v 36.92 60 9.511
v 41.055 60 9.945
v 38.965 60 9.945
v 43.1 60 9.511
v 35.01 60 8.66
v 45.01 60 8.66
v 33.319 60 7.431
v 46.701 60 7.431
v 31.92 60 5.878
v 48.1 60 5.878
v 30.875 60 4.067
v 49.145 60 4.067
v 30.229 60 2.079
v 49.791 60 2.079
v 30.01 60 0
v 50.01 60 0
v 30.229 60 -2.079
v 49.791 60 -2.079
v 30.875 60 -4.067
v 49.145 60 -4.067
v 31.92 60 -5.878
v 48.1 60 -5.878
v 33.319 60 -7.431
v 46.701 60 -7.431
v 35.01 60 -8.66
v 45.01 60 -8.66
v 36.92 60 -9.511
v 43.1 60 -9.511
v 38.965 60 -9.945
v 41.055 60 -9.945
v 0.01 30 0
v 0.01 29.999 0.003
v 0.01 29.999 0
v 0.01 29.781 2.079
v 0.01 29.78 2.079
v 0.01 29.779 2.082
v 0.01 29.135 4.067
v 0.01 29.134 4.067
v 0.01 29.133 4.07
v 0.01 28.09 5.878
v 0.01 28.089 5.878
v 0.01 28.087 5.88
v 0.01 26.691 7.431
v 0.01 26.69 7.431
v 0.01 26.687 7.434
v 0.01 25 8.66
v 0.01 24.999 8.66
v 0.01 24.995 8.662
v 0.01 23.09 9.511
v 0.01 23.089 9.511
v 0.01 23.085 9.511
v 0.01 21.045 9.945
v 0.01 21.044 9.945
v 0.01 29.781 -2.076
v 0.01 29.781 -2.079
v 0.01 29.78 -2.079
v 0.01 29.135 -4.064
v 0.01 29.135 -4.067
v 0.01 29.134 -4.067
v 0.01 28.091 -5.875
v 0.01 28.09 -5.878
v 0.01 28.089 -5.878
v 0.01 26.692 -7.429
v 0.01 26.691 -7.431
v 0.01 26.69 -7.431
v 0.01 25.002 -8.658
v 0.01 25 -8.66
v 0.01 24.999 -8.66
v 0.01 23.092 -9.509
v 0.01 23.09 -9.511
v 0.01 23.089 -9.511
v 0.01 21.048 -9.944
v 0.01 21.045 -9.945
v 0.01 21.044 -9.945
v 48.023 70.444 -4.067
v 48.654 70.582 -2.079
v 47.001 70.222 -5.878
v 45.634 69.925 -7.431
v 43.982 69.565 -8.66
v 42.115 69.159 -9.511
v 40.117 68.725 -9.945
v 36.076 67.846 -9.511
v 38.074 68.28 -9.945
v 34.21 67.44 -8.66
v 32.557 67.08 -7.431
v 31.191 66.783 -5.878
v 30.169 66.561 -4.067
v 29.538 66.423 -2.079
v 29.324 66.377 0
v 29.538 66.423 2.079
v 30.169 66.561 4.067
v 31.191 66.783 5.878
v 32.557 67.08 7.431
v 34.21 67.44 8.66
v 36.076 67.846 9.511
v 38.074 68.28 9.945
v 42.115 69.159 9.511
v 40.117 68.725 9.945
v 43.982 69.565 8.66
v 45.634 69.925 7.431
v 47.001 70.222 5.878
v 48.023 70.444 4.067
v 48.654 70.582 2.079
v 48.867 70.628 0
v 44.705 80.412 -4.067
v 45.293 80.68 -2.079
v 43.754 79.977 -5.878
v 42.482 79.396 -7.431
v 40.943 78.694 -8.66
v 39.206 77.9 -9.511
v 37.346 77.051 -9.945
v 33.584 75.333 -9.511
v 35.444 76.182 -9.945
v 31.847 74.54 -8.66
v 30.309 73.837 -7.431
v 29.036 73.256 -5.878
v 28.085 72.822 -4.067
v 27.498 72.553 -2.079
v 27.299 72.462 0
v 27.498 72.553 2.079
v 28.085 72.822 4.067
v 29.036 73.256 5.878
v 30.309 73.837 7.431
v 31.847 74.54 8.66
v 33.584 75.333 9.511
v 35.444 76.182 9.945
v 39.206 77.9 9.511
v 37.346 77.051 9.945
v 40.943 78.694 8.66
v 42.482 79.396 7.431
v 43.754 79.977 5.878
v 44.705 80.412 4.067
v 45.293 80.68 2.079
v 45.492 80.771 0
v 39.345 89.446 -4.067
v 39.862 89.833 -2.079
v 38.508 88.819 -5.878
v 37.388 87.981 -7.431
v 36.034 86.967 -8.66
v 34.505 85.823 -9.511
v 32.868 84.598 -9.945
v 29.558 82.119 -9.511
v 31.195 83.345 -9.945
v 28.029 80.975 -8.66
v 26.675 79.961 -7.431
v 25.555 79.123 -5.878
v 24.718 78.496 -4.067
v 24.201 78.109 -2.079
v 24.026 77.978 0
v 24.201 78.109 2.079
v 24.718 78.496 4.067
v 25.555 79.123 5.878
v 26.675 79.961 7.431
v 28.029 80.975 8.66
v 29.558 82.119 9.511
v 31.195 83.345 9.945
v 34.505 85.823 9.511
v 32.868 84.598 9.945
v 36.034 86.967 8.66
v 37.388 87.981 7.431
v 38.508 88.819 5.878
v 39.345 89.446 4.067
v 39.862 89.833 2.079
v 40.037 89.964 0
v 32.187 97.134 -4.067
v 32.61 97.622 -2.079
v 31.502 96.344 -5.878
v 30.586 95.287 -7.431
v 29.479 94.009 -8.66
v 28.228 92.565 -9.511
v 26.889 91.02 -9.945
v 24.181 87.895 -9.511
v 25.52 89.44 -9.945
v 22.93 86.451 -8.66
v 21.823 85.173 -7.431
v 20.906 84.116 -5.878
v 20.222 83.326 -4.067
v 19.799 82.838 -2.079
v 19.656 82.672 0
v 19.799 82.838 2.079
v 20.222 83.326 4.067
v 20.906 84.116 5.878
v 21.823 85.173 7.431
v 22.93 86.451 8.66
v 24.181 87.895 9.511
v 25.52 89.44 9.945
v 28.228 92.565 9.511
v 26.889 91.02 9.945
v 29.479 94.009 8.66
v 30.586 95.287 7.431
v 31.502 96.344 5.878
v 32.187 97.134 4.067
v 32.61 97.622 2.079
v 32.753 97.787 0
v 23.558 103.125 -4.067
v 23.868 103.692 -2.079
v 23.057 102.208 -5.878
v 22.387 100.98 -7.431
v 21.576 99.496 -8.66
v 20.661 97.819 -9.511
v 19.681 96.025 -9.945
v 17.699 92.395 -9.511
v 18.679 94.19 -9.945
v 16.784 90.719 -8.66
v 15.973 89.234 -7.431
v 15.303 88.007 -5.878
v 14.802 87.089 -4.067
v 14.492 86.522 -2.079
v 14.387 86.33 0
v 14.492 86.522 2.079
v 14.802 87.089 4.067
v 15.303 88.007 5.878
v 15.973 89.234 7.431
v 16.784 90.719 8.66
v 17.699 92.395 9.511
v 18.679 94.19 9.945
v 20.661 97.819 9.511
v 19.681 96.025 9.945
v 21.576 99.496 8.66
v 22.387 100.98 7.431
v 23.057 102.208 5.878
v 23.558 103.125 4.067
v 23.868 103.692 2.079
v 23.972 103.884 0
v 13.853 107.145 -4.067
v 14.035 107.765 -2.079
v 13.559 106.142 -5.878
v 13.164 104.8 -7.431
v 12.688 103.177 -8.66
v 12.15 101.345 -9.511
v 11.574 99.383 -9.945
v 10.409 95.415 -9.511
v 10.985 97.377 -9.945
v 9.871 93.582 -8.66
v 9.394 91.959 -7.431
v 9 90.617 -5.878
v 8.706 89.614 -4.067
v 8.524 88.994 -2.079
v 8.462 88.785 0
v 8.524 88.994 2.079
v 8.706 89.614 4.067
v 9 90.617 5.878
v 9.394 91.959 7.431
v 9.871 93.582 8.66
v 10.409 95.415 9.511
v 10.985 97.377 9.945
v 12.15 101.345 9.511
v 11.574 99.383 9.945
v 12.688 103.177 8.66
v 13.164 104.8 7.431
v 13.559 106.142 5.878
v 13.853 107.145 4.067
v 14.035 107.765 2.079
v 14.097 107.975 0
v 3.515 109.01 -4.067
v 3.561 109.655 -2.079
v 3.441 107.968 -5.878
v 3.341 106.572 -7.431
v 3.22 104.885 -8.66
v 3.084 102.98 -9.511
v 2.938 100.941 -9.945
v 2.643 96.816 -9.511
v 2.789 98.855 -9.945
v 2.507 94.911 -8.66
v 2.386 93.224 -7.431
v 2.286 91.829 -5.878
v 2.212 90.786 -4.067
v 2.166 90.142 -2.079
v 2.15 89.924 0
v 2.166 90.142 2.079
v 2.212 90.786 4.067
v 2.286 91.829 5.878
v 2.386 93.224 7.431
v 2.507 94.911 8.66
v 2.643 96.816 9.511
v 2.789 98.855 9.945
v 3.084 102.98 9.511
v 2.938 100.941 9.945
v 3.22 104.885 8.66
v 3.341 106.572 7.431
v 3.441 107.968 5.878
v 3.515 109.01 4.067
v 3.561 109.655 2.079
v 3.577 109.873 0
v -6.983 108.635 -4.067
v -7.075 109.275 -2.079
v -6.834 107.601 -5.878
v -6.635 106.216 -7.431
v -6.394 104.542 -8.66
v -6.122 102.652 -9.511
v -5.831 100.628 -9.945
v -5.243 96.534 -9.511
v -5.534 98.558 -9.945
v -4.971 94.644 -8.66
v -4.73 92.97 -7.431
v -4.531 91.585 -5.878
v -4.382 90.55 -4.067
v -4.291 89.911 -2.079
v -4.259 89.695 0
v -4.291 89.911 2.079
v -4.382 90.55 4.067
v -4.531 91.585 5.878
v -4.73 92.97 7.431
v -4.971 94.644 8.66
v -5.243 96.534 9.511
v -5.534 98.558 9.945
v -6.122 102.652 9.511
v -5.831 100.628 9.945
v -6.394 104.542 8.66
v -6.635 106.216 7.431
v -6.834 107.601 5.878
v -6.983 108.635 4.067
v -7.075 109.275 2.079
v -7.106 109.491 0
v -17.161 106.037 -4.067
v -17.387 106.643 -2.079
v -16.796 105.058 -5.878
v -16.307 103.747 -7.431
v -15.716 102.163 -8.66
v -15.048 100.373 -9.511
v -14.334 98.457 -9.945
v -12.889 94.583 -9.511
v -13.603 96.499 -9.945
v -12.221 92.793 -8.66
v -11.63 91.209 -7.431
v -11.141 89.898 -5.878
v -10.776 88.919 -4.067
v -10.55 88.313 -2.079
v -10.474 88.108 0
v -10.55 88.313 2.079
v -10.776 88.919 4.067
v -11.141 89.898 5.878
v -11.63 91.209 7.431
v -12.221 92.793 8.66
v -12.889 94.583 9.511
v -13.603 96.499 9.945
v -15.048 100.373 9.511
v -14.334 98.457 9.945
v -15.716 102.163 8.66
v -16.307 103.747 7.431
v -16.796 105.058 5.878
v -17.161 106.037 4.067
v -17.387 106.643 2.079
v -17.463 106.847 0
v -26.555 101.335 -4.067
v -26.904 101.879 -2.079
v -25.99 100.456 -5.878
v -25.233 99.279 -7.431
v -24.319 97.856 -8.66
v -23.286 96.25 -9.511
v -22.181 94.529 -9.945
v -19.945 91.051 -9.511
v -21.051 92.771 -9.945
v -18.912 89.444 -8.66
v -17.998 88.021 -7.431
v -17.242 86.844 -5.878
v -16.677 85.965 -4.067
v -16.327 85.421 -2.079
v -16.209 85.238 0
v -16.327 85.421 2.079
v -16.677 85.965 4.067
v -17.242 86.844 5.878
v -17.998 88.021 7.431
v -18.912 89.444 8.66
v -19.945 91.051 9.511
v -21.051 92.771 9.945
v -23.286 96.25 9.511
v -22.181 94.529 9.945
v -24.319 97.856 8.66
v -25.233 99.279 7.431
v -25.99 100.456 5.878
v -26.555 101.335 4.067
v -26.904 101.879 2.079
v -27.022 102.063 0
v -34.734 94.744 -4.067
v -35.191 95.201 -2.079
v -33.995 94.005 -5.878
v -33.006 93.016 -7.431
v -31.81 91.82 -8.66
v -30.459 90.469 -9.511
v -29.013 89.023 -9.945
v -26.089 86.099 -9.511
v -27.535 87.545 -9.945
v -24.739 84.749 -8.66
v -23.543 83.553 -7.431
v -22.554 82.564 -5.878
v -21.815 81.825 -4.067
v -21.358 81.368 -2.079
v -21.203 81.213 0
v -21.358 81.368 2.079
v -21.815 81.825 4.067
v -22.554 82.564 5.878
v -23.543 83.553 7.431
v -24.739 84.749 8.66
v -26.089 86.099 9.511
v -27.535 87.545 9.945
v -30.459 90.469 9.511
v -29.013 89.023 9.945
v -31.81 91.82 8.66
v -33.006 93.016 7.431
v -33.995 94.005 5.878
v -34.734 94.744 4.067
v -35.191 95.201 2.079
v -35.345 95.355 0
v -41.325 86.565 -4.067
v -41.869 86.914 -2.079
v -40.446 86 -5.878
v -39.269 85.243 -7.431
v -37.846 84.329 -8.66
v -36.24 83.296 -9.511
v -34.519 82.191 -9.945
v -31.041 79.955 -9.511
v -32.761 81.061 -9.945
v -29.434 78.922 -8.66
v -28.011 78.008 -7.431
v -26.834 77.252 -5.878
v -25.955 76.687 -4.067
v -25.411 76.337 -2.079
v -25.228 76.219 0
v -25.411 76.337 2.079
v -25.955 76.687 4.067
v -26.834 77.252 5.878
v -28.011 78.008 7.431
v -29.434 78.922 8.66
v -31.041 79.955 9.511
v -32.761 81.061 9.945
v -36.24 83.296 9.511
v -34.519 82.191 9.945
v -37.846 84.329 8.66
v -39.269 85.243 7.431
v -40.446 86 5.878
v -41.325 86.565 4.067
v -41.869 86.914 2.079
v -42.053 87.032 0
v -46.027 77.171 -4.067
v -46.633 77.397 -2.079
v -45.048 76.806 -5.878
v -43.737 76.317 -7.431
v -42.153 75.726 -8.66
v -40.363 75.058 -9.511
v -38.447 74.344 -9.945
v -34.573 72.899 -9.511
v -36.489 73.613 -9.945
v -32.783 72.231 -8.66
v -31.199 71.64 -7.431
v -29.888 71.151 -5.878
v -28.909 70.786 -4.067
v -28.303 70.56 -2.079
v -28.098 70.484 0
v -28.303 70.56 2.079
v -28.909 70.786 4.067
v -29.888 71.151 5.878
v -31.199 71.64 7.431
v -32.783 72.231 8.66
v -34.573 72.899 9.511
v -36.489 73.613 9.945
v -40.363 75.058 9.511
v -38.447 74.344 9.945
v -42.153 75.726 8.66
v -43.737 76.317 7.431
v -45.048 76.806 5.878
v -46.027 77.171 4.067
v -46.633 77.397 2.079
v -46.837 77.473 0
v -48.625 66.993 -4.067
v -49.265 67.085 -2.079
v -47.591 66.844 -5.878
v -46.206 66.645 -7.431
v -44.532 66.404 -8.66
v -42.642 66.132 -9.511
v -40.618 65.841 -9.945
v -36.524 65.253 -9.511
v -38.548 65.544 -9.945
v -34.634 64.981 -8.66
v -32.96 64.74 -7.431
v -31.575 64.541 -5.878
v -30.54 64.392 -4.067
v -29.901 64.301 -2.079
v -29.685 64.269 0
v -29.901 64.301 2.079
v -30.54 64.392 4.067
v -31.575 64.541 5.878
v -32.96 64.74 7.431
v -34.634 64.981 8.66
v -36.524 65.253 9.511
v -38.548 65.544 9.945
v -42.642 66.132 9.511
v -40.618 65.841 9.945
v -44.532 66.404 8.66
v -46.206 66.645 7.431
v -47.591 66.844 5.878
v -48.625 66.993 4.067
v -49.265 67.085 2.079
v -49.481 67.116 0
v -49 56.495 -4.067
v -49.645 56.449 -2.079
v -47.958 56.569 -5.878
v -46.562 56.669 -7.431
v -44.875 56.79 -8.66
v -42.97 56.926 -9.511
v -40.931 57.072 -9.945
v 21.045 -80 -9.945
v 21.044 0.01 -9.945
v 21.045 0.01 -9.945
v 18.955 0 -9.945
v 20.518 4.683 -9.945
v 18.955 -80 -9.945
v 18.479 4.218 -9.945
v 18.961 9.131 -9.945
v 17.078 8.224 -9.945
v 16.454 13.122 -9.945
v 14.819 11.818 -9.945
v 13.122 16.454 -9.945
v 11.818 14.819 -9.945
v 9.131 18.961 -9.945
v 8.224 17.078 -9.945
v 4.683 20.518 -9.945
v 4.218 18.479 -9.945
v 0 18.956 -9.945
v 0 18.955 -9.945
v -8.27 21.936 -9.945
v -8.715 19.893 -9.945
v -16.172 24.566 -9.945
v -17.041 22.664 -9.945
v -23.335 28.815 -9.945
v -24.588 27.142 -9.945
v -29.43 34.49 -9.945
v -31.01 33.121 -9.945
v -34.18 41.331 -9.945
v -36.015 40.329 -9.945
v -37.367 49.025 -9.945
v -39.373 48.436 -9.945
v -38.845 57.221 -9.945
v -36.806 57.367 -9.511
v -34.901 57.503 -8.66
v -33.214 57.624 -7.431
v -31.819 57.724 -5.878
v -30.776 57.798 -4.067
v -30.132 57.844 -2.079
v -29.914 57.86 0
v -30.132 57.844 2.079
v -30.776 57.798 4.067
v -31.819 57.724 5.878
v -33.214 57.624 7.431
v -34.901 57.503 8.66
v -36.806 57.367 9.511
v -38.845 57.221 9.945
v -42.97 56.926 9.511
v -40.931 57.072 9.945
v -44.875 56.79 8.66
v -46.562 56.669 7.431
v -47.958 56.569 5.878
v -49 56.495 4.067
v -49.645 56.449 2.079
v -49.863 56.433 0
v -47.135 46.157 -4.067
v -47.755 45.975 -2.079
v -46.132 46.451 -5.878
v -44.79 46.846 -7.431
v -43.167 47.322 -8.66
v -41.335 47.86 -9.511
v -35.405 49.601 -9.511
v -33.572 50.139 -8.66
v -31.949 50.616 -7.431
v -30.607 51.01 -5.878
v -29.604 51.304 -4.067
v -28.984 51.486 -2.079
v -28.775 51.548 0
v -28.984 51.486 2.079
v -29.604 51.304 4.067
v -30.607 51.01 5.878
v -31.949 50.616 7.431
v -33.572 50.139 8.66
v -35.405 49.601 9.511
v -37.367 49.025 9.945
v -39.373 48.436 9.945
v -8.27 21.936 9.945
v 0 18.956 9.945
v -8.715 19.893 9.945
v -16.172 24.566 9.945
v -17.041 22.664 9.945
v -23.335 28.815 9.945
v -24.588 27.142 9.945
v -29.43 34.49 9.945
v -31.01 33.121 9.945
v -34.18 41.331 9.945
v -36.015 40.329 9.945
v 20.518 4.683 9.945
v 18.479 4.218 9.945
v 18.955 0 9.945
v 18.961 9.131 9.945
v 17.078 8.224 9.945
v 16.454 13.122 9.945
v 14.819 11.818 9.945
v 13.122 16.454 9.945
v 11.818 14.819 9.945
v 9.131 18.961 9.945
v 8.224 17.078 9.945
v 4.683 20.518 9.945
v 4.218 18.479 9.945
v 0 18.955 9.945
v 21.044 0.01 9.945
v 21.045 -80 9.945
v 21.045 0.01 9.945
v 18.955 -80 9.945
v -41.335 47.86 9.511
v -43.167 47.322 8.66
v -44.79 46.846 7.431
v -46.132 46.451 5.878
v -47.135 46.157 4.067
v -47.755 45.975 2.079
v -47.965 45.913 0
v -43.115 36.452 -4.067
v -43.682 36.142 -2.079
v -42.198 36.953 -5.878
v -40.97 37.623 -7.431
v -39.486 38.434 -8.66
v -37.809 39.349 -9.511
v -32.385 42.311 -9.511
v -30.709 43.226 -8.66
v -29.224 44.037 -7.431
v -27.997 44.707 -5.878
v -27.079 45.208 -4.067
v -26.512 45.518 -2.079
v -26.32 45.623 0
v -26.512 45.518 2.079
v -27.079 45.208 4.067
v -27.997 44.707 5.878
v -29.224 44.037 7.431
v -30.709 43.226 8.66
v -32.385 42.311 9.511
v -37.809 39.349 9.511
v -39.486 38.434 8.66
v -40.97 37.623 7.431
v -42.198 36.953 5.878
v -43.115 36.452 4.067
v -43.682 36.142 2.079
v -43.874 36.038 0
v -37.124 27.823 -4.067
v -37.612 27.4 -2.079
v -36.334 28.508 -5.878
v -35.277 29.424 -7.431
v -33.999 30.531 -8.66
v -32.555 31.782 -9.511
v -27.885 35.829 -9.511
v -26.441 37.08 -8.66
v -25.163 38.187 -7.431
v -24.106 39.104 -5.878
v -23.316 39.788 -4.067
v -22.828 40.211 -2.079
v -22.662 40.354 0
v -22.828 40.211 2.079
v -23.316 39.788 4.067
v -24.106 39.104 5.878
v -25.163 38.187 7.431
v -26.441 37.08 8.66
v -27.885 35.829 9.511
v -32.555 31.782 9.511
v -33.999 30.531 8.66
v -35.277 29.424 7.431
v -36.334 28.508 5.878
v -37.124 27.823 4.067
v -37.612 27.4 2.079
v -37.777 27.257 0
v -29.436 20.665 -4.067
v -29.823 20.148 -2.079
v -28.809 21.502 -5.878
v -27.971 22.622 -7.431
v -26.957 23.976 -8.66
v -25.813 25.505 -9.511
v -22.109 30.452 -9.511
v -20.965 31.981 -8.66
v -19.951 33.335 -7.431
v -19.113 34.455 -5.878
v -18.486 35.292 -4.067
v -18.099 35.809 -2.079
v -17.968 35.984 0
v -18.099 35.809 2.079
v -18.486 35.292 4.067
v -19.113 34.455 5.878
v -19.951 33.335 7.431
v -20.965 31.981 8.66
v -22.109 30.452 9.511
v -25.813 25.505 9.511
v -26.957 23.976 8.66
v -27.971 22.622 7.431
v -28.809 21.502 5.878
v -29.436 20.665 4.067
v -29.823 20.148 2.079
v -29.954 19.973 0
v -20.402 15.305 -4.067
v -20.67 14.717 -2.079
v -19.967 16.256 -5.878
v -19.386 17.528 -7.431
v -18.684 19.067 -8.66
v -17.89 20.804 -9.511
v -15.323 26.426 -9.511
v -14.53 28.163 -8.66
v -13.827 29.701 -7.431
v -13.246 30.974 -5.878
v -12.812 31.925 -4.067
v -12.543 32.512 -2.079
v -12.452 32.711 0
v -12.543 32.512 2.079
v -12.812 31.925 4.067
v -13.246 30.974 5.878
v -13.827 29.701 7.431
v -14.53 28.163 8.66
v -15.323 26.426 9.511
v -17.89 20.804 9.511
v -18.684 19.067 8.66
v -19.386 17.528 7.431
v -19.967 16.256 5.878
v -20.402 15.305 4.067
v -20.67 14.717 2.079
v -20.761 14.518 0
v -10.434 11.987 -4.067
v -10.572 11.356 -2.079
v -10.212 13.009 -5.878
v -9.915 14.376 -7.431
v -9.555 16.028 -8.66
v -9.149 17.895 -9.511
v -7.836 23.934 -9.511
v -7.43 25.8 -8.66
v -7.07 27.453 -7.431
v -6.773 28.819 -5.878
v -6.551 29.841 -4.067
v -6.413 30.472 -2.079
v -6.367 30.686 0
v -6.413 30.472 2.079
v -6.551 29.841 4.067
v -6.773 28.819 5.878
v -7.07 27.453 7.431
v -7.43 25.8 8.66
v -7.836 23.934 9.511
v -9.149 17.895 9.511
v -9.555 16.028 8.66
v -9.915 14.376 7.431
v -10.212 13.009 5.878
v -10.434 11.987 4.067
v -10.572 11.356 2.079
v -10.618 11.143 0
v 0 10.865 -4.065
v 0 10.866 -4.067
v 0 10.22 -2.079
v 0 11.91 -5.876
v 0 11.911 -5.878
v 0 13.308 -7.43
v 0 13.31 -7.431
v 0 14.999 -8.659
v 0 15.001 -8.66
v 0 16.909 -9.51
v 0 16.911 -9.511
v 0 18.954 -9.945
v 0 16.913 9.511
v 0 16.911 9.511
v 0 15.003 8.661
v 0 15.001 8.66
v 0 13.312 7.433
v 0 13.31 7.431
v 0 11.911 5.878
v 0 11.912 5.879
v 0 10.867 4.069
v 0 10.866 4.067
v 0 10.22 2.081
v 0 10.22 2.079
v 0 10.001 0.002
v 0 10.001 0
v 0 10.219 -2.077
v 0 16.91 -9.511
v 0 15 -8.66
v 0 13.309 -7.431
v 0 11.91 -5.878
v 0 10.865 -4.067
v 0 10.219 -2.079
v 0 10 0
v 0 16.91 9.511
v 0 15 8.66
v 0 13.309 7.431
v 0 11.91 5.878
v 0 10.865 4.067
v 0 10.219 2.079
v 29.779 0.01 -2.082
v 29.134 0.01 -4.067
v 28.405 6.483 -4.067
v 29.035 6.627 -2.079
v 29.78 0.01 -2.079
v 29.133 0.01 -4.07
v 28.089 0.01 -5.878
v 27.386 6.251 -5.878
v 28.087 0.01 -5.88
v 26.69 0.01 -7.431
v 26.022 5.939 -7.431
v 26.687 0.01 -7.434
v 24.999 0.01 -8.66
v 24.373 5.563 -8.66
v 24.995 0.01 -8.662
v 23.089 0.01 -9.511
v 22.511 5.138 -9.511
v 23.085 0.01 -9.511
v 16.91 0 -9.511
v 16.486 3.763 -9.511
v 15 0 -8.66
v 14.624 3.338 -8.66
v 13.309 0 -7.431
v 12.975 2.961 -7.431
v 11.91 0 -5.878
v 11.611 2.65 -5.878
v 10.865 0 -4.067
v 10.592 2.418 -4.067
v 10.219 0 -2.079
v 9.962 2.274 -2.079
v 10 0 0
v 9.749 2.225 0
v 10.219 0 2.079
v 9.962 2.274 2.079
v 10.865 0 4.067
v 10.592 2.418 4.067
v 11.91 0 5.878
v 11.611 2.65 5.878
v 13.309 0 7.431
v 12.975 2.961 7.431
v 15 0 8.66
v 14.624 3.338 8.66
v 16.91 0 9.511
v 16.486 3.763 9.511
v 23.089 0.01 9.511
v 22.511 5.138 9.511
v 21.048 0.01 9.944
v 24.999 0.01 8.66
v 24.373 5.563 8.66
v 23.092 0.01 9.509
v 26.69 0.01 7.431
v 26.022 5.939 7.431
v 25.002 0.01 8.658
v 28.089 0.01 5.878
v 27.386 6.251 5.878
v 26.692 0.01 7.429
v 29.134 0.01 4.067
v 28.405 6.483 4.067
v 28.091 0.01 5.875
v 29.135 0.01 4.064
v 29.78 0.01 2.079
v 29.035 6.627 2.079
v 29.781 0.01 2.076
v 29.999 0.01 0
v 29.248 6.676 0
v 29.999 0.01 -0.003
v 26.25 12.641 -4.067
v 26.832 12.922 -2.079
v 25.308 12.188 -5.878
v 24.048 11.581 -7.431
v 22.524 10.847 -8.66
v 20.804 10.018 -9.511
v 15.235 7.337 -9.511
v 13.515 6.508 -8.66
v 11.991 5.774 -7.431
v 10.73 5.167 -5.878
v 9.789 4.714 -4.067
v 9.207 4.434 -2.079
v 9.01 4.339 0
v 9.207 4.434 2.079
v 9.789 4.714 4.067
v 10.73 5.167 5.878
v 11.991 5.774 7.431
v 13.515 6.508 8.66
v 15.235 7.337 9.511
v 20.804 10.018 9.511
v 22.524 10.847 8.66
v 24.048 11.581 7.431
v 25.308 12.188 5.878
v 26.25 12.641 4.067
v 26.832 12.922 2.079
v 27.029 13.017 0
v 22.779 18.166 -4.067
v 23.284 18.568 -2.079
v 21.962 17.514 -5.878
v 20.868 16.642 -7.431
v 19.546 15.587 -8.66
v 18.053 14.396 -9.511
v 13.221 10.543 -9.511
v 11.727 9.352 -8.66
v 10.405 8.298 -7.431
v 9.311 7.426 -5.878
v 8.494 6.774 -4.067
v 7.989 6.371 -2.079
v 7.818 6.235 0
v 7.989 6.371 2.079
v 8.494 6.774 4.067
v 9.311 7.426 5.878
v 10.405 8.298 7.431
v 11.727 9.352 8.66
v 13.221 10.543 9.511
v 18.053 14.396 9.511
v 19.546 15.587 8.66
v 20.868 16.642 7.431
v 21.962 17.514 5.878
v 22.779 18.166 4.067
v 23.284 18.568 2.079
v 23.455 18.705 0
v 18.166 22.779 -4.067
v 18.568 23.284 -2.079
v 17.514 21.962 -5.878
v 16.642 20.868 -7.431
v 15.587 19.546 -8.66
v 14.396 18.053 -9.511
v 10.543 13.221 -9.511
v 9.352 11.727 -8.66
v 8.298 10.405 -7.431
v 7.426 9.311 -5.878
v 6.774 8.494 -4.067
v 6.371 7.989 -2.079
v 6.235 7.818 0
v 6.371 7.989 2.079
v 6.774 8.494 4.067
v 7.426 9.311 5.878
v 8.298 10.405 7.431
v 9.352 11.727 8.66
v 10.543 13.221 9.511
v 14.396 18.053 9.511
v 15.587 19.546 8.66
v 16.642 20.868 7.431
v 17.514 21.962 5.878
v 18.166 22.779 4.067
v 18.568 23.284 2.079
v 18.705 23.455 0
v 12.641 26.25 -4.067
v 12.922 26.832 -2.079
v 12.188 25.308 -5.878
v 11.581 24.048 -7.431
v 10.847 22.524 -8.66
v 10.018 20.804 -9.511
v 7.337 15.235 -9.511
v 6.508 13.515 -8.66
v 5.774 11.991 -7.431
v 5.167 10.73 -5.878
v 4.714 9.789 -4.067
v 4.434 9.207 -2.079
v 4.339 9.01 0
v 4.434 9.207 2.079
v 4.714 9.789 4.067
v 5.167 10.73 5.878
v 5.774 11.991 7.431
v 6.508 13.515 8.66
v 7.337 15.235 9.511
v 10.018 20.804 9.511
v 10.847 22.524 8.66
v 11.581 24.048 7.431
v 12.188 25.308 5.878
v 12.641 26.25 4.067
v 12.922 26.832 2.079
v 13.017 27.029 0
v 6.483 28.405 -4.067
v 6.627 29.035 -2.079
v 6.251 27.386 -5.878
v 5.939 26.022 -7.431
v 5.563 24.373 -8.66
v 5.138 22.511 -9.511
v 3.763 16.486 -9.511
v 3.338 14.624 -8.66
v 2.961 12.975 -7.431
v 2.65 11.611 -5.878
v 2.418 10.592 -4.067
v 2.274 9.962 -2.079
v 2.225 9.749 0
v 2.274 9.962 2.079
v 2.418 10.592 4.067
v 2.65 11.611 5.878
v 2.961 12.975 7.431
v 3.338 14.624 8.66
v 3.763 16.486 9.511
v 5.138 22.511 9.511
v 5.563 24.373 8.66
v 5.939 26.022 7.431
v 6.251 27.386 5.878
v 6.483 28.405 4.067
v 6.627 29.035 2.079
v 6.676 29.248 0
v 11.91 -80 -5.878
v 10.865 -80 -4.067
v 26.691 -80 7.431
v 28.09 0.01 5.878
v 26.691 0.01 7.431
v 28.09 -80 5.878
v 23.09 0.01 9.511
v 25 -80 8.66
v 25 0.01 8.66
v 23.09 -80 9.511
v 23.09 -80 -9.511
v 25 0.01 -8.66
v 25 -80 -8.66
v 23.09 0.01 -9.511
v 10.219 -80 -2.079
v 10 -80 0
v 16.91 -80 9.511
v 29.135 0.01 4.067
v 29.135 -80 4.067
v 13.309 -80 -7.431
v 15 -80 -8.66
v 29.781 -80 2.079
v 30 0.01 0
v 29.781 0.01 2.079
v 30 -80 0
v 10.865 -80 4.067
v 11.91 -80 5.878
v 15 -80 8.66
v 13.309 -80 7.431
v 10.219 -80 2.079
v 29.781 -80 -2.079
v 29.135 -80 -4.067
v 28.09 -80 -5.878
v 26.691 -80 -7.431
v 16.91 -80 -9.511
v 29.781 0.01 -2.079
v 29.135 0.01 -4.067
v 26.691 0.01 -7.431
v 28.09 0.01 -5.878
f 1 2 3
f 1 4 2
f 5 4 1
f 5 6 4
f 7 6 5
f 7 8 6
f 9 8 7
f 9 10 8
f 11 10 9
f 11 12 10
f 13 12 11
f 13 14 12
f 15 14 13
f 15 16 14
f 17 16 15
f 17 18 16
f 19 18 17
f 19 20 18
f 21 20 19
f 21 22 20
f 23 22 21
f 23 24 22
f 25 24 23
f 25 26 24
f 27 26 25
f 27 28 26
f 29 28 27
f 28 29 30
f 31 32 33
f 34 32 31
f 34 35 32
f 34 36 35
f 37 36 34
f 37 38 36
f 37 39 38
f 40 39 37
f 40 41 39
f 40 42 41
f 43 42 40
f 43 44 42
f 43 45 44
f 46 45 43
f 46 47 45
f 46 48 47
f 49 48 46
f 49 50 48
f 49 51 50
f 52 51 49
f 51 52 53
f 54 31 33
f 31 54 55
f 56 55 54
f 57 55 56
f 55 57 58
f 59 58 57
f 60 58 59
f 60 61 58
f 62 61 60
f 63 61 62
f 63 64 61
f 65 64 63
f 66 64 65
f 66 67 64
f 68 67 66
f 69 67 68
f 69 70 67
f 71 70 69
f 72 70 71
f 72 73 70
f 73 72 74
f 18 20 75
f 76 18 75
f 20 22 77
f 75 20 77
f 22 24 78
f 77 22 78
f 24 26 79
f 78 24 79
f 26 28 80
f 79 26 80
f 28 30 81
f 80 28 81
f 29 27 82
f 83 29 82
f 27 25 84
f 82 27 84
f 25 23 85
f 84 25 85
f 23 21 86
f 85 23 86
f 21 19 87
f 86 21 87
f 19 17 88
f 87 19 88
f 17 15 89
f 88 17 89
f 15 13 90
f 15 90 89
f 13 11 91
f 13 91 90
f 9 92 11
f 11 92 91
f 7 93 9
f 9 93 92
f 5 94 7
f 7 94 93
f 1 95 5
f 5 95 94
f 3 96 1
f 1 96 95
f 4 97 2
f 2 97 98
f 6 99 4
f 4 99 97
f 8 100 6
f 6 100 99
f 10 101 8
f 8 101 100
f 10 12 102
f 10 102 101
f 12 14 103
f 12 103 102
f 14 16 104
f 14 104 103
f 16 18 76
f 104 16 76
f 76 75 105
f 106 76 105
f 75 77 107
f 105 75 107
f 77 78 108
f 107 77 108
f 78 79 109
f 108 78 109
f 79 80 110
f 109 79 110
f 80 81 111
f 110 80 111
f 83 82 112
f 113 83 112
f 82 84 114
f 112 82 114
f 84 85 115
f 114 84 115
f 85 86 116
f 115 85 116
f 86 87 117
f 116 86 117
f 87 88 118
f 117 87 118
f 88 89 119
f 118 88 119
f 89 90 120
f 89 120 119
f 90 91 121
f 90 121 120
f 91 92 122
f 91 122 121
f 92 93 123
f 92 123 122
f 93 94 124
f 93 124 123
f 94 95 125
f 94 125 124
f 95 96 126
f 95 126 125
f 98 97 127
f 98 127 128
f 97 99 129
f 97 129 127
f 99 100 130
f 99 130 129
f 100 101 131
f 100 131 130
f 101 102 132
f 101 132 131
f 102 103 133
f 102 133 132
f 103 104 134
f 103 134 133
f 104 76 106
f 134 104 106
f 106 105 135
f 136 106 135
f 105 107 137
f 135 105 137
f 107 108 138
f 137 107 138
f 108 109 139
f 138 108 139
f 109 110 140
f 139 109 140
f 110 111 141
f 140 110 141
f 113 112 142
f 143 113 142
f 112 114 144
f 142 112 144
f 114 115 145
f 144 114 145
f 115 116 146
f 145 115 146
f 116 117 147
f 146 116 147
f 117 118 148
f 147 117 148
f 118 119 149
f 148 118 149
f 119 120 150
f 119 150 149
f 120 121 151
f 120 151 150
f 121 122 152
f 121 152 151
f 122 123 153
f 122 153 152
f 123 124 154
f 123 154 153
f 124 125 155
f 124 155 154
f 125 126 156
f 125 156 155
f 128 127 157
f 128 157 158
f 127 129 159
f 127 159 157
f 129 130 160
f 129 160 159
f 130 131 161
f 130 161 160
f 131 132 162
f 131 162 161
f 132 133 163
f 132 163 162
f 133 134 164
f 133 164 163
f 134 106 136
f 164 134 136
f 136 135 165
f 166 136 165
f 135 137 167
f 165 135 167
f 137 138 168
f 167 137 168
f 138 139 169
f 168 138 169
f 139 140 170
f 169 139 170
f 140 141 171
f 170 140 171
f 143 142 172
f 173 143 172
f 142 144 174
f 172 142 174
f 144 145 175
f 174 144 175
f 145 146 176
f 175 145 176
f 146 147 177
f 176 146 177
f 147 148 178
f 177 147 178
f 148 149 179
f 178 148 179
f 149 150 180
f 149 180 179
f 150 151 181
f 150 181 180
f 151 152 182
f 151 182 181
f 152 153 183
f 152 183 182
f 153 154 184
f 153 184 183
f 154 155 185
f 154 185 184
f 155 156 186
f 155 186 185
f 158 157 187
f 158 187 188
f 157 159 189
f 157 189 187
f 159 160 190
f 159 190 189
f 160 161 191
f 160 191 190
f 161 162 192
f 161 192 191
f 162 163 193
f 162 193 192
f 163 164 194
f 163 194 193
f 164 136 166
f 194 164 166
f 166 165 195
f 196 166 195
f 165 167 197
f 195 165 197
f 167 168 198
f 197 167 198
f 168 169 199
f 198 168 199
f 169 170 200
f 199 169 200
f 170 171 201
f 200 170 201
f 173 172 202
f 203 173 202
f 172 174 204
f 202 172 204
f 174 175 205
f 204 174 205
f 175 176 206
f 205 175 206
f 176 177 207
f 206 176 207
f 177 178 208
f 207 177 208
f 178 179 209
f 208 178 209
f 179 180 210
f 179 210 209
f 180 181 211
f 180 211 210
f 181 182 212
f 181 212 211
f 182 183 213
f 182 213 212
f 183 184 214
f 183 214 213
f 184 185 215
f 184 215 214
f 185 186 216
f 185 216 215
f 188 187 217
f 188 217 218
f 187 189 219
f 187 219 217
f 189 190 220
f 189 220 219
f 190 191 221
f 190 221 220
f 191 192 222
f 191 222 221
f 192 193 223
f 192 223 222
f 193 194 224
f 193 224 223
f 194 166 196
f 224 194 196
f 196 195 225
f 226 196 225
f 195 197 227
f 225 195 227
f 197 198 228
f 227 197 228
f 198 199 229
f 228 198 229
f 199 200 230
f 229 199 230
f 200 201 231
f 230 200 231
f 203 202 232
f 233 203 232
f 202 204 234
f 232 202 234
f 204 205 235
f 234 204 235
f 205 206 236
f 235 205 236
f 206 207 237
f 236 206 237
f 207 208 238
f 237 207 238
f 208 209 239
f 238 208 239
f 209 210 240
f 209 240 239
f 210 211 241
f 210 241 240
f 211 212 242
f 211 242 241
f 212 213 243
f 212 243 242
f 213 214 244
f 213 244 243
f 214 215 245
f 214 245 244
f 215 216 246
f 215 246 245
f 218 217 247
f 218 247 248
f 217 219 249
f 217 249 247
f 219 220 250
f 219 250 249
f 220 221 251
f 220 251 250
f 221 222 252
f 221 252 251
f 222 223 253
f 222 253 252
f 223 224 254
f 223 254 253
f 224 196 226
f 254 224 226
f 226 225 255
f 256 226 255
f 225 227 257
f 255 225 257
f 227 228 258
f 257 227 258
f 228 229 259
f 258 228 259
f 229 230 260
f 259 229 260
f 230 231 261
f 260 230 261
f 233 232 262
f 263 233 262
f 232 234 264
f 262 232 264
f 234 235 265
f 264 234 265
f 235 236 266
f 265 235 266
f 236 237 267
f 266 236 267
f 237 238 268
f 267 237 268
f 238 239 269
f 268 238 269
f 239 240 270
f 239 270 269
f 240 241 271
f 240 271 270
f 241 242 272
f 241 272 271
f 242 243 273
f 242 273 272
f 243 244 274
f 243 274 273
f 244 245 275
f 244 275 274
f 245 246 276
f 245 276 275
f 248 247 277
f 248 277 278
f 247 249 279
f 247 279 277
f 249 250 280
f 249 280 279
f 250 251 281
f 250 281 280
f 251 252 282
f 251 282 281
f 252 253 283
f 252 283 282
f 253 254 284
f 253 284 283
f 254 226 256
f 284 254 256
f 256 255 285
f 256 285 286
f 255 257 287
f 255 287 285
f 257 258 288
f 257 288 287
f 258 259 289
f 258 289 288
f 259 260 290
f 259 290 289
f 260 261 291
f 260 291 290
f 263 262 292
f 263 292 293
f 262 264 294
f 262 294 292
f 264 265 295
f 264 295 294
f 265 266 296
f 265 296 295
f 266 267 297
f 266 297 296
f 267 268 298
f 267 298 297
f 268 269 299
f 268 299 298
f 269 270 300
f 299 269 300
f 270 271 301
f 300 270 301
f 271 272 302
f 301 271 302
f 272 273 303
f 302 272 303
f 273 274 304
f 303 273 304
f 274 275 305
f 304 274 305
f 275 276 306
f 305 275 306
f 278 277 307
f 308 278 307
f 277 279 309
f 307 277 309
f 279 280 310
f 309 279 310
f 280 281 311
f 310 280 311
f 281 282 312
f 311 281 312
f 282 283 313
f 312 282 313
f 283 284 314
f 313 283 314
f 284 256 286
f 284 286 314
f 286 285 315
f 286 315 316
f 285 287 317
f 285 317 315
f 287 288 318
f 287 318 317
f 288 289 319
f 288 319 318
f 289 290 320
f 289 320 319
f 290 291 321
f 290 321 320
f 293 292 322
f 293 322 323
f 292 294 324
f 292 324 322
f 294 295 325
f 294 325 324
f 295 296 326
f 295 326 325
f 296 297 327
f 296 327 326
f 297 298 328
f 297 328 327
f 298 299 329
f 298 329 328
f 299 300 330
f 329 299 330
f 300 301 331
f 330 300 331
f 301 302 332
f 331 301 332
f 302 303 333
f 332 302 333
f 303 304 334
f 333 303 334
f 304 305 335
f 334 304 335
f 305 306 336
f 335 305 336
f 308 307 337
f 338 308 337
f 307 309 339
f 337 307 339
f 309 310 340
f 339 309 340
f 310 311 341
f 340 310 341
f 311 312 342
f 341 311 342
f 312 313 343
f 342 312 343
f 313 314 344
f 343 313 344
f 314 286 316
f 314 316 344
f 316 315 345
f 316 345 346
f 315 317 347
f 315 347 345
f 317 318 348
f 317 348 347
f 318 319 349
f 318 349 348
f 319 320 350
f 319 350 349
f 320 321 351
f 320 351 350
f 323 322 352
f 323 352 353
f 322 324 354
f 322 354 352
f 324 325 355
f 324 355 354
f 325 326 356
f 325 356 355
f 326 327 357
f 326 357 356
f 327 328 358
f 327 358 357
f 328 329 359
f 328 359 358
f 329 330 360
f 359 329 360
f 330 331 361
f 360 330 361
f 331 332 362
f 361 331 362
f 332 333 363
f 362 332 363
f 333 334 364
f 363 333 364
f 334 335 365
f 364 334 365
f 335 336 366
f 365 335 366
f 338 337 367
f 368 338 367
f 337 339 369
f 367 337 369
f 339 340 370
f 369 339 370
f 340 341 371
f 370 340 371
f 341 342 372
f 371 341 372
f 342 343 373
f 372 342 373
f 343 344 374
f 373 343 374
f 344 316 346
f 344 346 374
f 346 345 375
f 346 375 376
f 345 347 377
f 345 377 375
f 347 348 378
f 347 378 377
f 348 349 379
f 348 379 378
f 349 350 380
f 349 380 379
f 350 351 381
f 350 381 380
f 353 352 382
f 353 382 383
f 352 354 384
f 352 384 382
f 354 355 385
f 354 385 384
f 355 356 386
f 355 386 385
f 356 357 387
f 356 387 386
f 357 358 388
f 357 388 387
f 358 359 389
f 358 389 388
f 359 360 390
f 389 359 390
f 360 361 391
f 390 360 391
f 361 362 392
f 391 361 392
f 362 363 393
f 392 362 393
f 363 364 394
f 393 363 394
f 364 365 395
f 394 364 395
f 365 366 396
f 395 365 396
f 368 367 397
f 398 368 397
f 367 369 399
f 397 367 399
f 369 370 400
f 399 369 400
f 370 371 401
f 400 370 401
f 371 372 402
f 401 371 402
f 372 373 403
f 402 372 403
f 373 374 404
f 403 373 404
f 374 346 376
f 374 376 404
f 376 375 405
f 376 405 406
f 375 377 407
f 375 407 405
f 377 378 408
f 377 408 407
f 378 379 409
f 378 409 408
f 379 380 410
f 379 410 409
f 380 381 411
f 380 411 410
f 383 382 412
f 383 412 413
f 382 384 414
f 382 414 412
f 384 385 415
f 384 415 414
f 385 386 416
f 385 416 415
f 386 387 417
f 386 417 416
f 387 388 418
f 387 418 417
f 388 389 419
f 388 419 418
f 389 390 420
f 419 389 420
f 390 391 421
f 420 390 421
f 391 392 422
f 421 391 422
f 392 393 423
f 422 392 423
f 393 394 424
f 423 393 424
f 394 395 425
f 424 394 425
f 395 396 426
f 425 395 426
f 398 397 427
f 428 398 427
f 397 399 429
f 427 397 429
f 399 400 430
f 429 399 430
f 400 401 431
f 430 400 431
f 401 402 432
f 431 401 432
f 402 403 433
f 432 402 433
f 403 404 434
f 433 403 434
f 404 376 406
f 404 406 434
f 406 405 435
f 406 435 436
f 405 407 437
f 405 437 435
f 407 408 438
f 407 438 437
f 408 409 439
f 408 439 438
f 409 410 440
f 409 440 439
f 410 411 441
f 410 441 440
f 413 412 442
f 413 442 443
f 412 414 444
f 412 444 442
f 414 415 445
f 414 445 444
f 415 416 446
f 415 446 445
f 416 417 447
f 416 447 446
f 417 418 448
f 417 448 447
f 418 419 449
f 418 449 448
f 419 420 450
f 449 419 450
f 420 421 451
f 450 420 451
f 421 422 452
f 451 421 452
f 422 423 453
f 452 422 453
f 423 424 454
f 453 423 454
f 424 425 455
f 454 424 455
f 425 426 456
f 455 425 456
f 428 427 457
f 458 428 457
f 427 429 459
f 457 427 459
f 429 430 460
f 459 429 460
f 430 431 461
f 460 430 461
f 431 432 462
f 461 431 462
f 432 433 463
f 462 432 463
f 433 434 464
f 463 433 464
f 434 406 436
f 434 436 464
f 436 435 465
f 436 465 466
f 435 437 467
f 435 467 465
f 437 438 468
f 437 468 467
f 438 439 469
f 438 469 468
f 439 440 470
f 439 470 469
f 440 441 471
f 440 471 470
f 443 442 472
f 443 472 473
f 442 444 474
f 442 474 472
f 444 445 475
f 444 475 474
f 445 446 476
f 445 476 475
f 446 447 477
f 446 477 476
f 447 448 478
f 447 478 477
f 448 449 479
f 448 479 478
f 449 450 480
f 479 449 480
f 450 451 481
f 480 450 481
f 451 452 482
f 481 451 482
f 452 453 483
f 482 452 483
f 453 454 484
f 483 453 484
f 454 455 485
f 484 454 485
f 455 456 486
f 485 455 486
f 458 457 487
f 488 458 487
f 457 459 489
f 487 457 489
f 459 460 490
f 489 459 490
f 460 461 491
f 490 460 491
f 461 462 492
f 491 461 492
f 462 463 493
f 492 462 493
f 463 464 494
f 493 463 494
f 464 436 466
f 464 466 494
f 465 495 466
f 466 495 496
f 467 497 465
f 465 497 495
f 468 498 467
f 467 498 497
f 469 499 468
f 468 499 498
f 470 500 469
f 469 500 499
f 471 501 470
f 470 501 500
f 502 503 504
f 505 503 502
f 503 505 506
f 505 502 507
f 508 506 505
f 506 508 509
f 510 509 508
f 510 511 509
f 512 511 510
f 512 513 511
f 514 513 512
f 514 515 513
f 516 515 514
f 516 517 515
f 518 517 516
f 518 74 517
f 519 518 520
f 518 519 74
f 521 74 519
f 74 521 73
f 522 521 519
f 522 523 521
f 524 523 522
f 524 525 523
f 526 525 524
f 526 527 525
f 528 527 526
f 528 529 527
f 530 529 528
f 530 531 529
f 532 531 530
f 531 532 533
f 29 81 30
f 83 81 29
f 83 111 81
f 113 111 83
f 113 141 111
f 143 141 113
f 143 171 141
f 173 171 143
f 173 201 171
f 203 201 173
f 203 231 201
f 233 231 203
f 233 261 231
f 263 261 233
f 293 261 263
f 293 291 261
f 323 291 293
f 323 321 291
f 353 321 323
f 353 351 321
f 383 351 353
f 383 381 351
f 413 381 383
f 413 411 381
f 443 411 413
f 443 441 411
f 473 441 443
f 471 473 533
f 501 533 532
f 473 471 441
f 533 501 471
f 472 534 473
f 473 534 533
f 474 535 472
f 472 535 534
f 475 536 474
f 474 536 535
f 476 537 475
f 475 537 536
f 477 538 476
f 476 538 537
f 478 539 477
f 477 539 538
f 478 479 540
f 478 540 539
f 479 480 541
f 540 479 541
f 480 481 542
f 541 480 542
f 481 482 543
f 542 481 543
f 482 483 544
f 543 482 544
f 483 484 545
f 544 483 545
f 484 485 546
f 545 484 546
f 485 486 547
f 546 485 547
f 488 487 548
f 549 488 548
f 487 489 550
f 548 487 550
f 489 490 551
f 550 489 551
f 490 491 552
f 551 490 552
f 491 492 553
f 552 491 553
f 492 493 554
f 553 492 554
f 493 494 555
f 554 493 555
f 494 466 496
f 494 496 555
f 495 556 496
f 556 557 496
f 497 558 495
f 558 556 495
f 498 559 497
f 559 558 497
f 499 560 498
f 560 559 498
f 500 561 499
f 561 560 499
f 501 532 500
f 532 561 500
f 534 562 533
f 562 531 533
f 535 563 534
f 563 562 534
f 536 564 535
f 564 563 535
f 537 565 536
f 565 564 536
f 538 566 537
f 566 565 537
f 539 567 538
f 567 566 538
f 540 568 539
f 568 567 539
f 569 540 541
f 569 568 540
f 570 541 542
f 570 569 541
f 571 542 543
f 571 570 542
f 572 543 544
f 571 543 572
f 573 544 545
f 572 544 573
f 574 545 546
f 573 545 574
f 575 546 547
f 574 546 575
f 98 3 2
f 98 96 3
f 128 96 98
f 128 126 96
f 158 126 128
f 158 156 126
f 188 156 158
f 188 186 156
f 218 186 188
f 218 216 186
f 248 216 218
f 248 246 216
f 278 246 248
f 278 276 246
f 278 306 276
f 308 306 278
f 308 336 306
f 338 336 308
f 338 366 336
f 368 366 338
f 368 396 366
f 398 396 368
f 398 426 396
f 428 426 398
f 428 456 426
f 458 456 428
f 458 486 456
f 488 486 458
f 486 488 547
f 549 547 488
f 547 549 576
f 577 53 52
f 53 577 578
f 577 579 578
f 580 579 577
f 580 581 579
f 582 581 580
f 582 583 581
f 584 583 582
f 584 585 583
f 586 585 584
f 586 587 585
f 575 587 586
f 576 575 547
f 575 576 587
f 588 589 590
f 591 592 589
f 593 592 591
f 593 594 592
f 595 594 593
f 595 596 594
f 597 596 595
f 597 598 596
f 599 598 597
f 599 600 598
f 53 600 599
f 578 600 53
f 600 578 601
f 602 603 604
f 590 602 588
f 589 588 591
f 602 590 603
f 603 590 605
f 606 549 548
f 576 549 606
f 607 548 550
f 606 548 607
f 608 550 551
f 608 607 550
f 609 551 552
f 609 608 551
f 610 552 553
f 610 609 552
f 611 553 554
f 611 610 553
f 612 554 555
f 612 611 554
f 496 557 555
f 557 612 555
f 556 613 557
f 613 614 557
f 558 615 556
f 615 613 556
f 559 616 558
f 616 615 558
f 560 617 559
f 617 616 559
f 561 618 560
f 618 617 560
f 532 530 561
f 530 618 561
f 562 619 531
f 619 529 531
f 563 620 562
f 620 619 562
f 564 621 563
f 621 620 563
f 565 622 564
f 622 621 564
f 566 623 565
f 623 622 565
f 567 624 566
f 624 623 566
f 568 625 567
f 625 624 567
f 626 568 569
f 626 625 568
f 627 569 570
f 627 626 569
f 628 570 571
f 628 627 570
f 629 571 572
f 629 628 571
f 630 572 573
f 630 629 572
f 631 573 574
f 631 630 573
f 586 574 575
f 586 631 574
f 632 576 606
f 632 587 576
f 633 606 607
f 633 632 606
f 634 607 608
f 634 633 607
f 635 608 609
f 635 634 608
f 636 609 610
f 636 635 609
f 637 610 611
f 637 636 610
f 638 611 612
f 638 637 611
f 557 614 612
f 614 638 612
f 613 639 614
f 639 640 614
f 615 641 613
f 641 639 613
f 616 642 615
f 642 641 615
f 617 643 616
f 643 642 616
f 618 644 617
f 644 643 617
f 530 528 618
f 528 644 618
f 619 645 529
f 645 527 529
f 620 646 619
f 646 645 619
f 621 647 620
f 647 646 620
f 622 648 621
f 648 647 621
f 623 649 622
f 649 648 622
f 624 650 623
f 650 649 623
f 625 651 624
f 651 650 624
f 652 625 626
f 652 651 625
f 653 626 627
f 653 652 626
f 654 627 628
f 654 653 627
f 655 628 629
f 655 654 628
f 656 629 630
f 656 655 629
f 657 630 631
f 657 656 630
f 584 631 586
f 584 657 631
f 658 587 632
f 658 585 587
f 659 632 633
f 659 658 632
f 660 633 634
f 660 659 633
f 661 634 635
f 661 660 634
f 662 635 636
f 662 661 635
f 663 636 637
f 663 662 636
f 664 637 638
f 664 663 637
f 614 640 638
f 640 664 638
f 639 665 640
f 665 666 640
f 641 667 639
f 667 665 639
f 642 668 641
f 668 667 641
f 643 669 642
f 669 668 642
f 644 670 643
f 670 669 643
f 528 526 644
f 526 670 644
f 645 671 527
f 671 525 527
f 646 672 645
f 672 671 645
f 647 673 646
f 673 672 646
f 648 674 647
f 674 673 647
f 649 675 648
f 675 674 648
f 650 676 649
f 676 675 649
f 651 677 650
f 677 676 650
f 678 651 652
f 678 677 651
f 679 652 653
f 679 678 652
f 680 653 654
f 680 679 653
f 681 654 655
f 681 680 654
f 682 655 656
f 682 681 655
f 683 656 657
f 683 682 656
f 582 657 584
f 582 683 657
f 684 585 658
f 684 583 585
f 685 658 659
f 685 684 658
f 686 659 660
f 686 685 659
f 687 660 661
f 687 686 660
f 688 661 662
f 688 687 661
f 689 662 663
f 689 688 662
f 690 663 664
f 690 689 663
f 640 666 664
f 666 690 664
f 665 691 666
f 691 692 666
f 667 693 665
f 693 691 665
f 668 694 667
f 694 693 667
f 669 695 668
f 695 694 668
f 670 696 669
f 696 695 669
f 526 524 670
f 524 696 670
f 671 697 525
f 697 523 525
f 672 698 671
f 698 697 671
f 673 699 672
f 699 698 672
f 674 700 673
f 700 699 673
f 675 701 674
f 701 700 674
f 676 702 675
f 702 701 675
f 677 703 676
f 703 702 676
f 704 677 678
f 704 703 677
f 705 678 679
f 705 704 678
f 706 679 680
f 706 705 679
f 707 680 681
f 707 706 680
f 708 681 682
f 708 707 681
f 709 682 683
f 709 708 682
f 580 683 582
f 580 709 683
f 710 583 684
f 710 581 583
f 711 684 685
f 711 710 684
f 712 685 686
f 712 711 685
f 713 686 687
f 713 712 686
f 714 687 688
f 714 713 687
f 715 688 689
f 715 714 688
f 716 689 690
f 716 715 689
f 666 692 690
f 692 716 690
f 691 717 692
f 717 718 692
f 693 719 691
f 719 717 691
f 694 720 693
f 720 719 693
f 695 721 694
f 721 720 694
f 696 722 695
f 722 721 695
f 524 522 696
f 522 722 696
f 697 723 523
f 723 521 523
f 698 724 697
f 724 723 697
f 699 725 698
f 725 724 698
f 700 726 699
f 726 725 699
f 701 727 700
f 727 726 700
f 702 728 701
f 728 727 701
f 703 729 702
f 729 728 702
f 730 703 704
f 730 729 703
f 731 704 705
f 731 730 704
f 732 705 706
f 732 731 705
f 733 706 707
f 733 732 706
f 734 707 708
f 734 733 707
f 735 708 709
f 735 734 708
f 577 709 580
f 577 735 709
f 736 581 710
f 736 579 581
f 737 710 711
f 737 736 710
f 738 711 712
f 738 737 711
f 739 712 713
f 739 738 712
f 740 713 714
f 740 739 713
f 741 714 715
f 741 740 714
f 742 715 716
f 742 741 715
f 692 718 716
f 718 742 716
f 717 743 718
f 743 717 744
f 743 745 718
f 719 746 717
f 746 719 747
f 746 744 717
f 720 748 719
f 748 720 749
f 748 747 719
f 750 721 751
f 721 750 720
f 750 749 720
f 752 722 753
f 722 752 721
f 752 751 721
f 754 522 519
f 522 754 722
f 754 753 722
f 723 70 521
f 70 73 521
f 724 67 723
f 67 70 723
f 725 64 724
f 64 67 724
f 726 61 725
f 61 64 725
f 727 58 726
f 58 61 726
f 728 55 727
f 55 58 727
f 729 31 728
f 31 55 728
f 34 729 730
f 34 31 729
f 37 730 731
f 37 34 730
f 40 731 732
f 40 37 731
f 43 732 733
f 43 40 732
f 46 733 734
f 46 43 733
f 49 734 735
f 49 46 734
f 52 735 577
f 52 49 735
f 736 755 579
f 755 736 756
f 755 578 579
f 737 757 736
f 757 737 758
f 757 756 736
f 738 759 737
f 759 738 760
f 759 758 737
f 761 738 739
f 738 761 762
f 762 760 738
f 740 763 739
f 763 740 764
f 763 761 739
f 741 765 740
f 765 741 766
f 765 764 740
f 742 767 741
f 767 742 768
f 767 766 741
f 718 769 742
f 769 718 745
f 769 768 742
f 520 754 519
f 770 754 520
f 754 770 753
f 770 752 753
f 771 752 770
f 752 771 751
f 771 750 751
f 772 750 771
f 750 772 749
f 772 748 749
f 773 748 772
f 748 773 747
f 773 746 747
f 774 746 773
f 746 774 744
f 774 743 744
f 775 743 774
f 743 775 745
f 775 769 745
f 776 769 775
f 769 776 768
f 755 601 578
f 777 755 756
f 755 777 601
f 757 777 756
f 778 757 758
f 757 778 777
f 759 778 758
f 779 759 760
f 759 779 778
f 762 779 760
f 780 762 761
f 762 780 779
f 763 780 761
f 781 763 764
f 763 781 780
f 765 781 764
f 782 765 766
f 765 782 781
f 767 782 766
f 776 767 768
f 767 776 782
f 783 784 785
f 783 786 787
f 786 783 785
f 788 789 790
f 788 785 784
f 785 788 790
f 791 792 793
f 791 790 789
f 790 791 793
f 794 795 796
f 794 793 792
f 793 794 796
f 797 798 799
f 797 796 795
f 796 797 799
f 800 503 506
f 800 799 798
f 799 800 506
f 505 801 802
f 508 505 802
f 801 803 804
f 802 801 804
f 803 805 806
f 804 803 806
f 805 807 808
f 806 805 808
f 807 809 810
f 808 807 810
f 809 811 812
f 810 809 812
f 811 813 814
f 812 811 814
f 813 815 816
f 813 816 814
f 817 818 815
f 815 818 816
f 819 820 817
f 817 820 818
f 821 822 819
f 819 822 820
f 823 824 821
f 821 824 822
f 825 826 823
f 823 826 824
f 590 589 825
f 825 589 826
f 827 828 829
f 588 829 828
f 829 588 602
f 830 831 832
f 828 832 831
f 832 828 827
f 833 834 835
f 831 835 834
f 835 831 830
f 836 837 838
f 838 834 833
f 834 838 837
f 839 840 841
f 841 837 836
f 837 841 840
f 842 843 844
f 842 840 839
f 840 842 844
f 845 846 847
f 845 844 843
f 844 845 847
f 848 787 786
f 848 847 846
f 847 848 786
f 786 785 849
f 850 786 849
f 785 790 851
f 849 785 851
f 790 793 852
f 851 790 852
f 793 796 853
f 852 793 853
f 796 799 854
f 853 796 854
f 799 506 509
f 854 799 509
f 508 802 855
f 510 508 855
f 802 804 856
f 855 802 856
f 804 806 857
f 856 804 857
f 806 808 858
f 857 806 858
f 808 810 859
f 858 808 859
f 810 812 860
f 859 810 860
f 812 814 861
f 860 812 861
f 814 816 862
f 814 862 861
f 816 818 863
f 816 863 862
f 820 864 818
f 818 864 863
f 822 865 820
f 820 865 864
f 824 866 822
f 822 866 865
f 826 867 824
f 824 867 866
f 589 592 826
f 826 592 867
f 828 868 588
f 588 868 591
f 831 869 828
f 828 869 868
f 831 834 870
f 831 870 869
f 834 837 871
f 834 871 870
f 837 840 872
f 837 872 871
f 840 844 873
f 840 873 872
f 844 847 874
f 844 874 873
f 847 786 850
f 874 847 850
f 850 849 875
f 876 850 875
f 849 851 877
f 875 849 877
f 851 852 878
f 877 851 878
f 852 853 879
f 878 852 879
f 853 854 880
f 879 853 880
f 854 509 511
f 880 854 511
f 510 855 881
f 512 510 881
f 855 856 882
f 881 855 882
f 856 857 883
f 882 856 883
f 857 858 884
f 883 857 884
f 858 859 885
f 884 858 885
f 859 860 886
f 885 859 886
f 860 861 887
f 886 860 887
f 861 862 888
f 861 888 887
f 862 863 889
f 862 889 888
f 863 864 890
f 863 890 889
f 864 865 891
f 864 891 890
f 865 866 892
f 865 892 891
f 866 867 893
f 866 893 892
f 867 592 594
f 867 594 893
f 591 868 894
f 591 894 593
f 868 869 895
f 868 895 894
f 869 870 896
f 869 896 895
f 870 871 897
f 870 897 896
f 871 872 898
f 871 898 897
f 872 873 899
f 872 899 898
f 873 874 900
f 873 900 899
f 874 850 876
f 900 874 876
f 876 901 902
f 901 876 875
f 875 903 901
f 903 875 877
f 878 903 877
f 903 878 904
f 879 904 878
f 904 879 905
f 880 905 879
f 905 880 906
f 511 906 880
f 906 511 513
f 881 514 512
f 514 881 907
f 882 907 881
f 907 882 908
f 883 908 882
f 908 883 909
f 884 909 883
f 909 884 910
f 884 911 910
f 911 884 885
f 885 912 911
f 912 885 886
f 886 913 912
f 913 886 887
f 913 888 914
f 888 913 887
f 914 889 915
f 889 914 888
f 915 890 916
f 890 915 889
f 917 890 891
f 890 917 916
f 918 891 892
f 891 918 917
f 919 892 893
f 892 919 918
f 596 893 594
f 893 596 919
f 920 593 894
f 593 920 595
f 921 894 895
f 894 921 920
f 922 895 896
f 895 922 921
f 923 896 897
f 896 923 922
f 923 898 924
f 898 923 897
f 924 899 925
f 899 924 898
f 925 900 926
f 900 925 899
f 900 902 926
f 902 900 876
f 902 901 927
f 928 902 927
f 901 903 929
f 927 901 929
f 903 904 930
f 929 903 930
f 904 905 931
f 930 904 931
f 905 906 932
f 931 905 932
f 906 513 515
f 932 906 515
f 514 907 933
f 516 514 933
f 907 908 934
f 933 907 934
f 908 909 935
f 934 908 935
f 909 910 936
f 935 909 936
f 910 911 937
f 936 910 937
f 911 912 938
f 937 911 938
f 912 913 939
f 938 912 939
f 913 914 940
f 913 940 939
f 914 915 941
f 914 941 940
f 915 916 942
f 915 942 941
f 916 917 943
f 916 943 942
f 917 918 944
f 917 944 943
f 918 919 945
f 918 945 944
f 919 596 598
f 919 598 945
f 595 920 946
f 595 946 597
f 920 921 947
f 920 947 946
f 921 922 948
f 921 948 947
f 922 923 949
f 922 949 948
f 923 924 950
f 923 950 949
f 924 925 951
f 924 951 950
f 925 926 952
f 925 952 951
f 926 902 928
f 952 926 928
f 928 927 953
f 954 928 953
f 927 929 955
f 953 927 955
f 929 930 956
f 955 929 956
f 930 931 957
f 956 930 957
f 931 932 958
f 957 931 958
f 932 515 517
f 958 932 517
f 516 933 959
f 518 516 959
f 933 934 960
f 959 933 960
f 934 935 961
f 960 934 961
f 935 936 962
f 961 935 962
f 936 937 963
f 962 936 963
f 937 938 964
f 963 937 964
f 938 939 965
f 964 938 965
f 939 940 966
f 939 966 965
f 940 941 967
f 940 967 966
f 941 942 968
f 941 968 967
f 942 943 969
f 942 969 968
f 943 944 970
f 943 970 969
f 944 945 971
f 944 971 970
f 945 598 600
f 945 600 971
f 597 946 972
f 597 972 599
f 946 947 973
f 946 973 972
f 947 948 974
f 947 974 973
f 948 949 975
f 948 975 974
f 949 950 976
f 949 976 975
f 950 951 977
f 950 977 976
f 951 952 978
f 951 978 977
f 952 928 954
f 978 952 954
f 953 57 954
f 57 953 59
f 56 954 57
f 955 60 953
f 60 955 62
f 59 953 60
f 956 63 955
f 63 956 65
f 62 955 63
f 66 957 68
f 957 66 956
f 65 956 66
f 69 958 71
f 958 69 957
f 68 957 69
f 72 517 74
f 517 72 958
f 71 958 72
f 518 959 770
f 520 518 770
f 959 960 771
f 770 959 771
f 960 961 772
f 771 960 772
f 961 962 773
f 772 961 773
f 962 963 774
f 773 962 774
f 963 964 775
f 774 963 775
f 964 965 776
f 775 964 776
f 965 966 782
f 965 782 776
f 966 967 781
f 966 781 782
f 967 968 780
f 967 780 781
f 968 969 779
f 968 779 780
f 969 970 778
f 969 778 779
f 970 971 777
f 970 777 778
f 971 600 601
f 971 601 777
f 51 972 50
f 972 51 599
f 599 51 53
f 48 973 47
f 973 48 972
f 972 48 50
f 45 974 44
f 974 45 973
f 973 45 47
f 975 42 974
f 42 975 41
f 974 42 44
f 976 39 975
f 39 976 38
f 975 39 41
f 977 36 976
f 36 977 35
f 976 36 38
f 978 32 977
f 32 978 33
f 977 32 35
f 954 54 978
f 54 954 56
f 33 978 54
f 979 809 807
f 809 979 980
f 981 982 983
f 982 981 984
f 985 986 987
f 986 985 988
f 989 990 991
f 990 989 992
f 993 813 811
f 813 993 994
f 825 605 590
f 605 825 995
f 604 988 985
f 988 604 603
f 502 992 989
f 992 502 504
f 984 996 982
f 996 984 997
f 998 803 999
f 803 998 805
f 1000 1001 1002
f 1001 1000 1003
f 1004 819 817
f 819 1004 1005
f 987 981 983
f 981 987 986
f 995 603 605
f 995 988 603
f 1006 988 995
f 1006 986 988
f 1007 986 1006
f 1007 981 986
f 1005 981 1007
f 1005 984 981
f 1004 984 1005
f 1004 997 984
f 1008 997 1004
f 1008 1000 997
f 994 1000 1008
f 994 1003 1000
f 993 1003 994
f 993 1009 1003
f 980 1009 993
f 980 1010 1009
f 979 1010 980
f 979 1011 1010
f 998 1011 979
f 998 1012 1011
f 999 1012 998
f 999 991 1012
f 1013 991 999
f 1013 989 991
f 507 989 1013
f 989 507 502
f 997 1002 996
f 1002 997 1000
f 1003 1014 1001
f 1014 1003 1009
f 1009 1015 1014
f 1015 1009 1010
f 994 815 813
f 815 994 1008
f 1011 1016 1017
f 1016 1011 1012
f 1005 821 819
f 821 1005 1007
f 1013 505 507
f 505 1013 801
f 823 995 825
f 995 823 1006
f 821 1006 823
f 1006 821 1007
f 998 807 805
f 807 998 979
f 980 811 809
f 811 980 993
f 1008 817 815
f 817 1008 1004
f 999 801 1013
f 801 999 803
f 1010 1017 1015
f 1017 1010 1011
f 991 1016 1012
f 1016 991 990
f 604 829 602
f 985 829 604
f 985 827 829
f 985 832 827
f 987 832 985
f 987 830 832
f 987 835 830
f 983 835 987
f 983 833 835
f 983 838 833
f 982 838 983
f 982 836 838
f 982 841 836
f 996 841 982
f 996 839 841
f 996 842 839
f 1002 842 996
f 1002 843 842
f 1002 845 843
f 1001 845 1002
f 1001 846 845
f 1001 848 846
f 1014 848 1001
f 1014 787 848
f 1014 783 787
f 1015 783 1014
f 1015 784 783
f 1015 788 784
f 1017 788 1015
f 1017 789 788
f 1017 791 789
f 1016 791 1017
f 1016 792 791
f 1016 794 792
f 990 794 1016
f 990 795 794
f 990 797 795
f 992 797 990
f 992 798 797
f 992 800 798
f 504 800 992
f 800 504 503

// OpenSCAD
// Unit of length: Unit.MM
union()
{
   translate(v = [0.01, 60.0, 0.0])
   {
      rotate_extrude(angle = 270.0, convexity = 10)
      {
         translate(v = [40.0, 0.0])
         {
            circle(d = 20.0);
         }
      }
   }
   rotate_extrude(angle = 90.0, convexity = 10)
   {
      translate(v = [20.0, 0.0])
      {
         circle(d = 20.0);
      }
   }
   translate(v = [20.0, 0.01])
   {
      rotate(a = [90.0, 0.0, 0.0])
      {
         cylinder(h = 80.01, d = 20.0, center = false);
      }
   }
}
